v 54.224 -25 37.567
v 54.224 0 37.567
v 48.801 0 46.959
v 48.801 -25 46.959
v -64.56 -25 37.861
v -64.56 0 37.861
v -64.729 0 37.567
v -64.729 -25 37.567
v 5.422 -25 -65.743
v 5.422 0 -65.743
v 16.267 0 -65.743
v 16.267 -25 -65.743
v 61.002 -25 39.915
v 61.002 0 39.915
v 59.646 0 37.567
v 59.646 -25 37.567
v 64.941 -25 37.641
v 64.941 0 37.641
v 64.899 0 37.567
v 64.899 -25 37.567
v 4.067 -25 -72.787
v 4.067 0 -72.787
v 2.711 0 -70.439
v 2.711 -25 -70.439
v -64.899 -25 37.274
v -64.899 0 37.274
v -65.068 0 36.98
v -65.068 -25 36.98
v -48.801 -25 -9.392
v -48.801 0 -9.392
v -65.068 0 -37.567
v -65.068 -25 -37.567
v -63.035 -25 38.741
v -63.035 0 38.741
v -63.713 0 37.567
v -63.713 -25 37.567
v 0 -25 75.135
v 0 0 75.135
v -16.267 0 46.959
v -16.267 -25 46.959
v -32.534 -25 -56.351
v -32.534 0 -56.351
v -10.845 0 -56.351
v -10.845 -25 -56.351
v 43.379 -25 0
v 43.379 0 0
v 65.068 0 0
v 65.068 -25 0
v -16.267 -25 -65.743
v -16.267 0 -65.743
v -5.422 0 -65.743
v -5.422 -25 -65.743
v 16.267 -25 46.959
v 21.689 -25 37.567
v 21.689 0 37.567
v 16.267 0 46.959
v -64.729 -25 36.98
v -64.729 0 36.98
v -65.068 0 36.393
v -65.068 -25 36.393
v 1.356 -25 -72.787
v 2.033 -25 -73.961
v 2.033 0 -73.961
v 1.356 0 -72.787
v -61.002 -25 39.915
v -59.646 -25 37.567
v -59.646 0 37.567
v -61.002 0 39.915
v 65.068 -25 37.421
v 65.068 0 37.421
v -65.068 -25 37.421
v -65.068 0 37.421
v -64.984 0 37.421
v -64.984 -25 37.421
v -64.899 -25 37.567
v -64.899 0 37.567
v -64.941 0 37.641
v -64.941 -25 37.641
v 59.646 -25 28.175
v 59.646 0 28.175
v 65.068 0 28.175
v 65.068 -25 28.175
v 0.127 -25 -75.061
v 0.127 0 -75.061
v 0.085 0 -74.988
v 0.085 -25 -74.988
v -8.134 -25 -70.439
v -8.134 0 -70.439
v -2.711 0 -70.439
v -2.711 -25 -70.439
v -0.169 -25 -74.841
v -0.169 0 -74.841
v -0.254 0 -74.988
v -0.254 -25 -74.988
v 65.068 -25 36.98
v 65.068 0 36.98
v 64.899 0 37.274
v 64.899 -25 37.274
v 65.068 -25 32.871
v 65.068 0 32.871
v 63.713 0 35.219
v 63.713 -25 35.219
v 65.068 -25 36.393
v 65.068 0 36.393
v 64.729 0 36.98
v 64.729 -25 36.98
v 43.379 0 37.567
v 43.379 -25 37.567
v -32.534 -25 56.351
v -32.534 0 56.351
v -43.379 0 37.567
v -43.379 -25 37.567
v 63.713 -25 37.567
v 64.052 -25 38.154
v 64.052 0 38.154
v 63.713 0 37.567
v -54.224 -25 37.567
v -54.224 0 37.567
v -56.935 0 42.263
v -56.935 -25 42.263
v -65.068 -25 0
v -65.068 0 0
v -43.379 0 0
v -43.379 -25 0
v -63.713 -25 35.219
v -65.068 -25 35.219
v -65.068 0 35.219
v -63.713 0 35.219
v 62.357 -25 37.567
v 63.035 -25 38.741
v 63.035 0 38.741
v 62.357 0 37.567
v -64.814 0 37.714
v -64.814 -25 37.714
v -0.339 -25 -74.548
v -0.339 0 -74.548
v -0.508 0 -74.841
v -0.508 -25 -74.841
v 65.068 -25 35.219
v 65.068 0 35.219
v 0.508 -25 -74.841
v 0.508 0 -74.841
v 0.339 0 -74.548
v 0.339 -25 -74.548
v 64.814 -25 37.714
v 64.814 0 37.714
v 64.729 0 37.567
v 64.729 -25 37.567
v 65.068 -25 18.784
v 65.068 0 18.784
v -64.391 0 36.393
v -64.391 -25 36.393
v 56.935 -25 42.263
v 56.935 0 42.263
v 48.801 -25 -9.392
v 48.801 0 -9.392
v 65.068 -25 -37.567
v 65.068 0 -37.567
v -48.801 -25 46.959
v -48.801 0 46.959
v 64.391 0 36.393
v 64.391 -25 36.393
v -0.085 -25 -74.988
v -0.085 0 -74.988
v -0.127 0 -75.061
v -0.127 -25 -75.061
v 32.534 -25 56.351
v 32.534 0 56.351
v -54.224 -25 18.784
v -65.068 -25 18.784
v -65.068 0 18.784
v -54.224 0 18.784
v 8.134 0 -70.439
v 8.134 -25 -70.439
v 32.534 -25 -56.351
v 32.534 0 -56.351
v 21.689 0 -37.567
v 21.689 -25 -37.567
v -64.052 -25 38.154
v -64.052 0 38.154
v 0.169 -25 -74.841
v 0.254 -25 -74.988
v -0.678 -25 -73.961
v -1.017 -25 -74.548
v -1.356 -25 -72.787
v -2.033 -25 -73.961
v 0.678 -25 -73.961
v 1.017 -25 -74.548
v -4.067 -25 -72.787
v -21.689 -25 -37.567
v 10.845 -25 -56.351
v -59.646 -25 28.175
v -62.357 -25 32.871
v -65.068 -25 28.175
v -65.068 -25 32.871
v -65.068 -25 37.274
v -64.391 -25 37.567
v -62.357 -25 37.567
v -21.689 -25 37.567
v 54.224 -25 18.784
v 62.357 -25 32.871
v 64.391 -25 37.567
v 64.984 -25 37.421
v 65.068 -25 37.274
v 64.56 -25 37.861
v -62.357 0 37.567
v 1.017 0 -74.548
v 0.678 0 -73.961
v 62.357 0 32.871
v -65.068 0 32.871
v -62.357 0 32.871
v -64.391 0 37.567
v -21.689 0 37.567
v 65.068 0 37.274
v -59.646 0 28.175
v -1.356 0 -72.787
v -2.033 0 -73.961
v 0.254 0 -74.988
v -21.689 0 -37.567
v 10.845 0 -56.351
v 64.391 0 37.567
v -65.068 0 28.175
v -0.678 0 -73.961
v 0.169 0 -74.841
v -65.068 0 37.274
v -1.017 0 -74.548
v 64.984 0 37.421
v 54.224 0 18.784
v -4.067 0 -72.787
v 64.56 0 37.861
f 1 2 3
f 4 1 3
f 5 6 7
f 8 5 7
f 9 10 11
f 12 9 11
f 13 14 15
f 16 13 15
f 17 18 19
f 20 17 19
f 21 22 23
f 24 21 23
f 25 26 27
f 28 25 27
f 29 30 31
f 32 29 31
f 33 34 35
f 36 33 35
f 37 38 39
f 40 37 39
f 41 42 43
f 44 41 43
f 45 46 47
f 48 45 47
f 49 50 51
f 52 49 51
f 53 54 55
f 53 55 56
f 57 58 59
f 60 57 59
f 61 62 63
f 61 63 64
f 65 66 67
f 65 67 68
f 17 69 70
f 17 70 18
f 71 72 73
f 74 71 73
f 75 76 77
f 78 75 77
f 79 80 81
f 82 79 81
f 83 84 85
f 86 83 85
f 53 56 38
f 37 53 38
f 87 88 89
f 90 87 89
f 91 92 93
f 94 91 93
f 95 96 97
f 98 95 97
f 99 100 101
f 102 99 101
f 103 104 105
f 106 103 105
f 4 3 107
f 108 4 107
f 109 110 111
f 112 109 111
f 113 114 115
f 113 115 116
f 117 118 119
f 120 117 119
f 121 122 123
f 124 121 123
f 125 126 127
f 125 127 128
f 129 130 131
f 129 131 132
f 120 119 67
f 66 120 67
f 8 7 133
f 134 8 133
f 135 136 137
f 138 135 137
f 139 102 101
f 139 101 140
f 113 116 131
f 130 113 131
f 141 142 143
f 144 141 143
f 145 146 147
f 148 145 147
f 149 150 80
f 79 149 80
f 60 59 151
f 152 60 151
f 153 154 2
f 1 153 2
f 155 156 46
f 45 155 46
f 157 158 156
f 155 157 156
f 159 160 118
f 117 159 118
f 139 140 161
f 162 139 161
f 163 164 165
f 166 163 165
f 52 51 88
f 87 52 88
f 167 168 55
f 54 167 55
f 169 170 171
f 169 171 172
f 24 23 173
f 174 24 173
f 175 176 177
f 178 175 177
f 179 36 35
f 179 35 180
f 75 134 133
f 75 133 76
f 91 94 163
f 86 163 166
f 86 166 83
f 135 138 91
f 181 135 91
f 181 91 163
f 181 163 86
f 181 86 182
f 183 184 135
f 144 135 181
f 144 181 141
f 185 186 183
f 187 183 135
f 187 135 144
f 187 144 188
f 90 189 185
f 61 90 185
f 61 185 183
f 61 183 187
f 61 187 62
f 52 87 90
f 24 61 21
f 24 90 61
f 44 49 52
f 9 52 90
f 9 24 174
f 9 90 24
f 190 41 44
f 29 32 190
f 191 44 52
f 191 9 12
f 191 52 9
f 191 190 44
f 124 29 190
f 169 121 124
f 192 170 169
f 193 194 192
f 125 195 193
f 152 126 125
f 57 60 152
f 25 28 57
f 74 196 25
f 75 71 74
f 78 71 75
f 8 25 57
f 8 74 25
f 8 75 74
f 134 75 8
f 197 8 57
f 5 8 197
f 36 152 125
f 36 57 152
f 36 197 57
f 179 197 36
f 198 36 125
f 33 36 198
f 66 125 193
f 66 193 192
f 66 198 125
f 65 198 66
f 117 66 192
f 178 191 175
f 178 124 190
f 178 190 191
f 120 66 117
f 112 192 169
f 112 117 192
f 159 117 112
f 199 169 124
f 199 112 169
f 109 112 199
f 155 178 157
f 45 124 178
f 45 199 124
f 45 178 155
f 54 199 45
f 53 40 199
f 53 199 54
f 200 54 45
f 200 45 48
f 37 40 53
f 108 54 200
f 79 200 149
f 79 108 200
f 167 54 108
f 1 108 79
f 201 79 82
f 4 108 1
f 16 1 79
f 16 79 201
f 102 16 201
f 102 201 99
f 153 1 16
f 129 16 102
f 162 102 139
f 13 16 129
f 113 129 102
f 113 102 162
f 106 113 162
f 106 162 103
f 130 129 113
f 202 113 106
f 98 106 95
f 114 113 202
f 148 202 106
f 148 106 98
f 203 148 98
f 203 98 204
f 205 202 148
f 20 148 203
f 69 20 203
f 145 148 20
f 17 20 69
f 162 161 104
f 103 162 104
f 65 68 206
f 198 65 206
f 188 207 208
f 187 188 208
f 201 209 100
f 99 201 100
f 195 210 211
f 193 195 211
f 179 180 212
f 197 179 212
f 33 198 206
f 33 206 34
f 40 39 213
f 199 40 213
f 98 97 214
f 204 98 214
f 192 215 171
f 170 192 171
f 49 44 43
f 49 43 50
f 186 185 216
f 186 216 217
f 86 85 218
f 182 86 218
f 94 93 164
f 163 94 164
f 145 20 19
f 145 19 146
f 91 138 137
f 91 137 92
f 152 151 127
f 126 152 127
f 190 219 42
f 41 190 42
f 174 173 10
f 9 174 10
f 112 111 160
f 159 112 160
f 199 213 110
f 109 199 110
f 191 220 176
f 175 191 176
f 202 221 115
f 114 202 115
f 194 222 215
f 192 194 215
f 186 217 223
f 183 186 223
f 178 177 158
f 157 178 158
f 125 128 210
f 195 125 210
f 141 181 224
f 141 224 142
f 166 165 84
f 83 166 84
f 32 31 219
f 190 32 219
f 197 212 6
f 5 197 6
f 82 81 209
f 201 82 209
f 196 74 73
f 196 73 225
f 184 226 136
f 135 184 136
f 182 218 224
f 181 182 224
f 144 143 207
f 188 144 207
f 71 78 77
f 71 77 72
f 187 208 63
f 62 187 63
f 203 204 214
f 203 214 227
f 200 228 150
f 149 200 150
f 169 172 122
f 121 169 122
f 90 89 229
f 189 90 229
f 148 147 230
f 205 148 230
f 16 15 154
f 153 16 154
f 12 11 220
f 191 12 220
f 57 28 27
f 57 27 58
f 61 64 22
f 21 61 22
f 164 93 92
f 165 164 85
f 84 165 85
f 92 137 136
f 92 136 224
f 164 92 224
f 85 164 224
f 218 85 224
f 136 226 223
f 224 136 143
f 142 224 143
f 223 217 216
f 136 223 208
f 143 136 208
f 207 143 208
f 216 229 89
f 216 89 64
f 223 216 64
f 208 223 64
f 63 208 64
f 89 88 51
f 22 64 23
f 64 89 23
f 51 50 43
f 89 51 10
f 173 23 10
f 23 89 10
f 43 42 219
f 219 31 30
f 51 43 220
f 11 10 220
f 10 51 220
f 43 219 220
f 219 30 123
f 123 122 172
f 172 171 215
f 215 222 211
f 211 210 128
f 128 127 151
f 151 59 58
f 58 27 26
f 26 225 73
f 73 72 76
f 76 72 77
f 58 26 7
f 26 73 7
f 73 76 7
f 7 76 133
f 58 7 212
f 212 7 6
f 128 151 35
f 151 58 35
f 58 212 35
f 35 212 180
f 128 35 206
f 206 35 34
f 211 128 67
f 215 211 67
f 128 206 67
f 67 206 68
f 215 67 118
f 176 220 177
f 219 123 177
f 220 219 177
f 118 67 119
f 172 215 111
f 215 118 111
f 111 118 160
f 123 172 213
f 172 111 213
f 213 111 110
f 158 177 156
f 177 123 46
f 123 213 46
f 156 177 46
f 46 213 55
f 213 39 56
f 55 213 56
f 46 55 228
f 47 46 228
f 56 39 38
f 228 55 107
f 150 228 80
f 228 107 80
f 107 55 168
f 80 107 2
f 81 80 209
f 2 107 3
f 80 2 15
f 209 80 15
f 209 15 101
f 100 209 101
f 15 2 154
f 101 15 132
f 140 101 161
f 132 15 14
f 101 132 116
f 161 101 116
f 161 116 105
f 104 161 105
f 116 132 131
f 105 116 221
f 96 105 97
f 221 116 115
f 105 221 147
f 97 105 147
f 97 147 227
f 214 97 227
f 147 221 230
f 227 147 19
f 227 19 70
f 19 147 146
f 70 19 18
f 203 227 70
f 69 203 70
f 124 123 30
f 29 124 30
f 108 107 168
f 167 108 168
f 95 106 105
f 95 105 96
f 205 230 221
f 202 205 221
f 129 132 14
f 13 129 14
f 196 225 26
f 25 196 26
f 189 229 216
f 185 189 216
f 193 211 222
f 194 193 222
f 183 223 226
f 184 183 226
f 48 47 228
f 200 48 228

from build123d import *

# Parameters (mm, degrees)
F1_DEPTH = 25


with BuildPart() as f1:
    # F0 (on Front) → F1 (new body)
    with BuildSketch(Plane.XZ):
        Polygon((54.223660749, 37.5672541559), (48.8012946741, 28.1754406169), (59.6460268239, 28.1754406169), (56.9348437865, 32.8713473864), align=None)
        Polygon((43.3789285992, 0), (32.5341964494, 18.7836270779), (21.6894642996, 0), align=None)
        Polygon((0, 0), (-10.8447321498, 18.7836270779), (-32.5341964494, 18.7836270779), (-21.6894642996, 0), align=None)
        Polygon((56.9348437865, 32.8713473864), (59.6460268239, 28.1754406169), (65.0683928988, 28.1754406169), (62.3572098614, 32.8713473864), align=None)
        Polygon((21.6894642996, 0), (32.5341964494, 18.7836270779), (10.8447321498, 18.7836270779), (0, 0), align=None)
        Polygon((48.8012946741, 28.1754406169), (54.223660749, 18.7836270779), (65.0683928988, 18.7836270779), (59.6460268239, 28.1754406169), align=None)
        Polygon((-21.6894642996, 0), (-43.3789285992, 0), (-48.8012946741, -9.391813539), (-16.2670982247, -9.391813539), align=None)
        Polygon((0, -37.5672541559), (-10.8447321498, -18.7836270779), (-21.6894642996, -37.5672541559), align=None)
        Polygon((32.5341964494, 18.7836270779), (21.6894642996, 37.5672541559), (10.8447321498, 18.7836270779), align=None)
        Polygon((-59.6460268239, 28.1754406169), (-48.8012946741, 28.1754406169), (-54.223660749, 37.5672541559), (-56.9348437865, 32.8713473864), align=None)
        Polygon((-10.8447321498, -18.7836270779), (0, 0), (-21.6894642996, 0), (-16.2670982247, -9.391813539), align=None)
        Polygon((54.223660749, 18.7836270779), (32.5341964494, 18.7836270779), (43.3789285992, 0), (65.0683928988, 0), align=None)
        Polygon((-21.6894642996, 0), (-32.5341964494, 18.7836270779), (-43.3789285992, 0), align=None)
        Polygon((32.5341964494, -37.5672541559), (16.2670982247, -9.391813539), (10.8447321498, -18.7836270779), (21.6894642996, -37.5672541559), align=None)
        Polygon((10.8447321498, -56.3508812338), (0, -37.5672541559), (-10.8447321498, -56.3508812338), (0, -56.3508812338), align=None)
        Polygon((48.8012946741, -9.391813539), (43.3789285992, 0), (21.6894642996, 0), (16.2670982247, -9.391813539), align=None)
        Polygon((48.8012946741, 46.9590676948), (43.3789285992, 37.5672541559), (48.8012946741, 28.1754406169), (54.223660749, 37.5672541559), align=None)
        Polygon((-21.6894642996, -37.5672541559), (-10.8447321498, -18.7836270779), (-16.2670982247, -9.391813539), (-32.5341964494, -37.5672541559), align=None)
        Polygon((43.3789285992, 37.5672541559), (32.5341964494, 18.7836270779), (54.223660749, 18.7836270779), (48.8012946741, 28.1754406169), align=None)
        Polygon((-10.8447321498, -56.3508812338), (0, -37.5672541559), (-21.6894642996, -37.5672541559), (-32.5341964494, -56.3508812338), align=None)
        Polygon((32.5341964494, 56.3508812338), (21.6894642996, 37.5672541559), (32.5341964494, 18.7836270779), (43.3789285992, 37.5672541559), align=None)
        Polygon((16.2670982247, -9.391813539), (21.6894642996, 0), (0, 0), (10.8447321498, -18.7836270779), align=None)
        Polygon((21.6894642996, -37.5672541559), (10.8447321498, -18.7836270779), (0, -37.5672541559), align=None)
        Polygon((16.2670982247, 46.9590676948), (0, 75.1345083117), (-16.2670982247, 46.9590676948), (0, 18.7836270779), align=None)
        Polygon((65.0683928988, -37.5672541559), (48.8012946741, -9.391813539), (16.2670982247, -9.391813539), (32.5341964494, -37.5672541559), align=None)
        Polygon((-16.2670982247, -9.391813539), (-48.8012946741, -9.391813539), (-65.0683928988, -37.5672541559), (-32.5341964494, -37.5672541559), align=None)
        Polygon((-43.3789285992, 0), (-32.5341964494, 18.7836270779), (-54.223660749, 18.7836270779), (-65.0683928988, 0), align=None)
        Polygon((-10.8447321498, 18.7836270779), (-21.6894642996, 37.5672541559), (-32.5341964494, 18.7836270779), align=None)
        Polygon((-65.0683928988, 18.7836270779), (-54.223660749, 18.7836270779), (-48.8012946741, 28.1754406169), (-59.6460268239, 28.1754406169), align=None)
        Polygon((-48.8012946741, 28.1754406169), (-43.3789285992, 37.5672541559), (-48.8012946741, 46.9590676948), (-54.223660749, 37.5672541559), align=None)
        Polygon((-32.5341964494, 18.7836270779), (-21.6894642996, 37.5672541559), (-32.5341964494, 56.3508812338), (-43.3789285992, 37.5672541559), align=None)
        Polygon((32.5341964494, -56.3508812338), (21.6894642996, -37.5672541559), (0, -37.5672541559), (10.8447321498, -56.3508812338), align=None)
        Polygon((16.2670982247, -65.7426947728), (10.8447321498, -56.3508812338), (0, -56.3508812338), (5.4223660749, -65.7426947728), align=None)
        Polygon((0, -56.3508812338), (-10.8447321498, -56.3508812338), (-16.2670982247, -65.7426947728), (-5.4223660749, -65.7426947728), align=None)
        Polygon((-54.223660749, 18.7836270779), (-32.5341964494, 18.7836270779), (-43.3789285992, 37.5672541559), (-48.8012946741, 28.1754406169), align=None)
        Polygon((21.6894642996, 37.5672541559), (16.2670982247, 46.9590676948), (0, 18.7836270779), (10.8447321498, 18.7836270779), align=None)
        Polygon((10.8447321498, -18.7836270779), (0, 0), (-10.8447321498, -18.7836270779), (0, -37.5672541559), align=None)
        Polygon((0, 18.7836270779), (-16.2670982247, 46.9590676948), (-21.6894642996, 37.5672541559), (-10.8447321498, 18.7836270779), align=None)
        Polygon((10.8447321498, 18.7836270779), (0, 18.7836270779), (-10.8447321498, 18.7836270779), (0, 0), align=None)
        Polygon((-56.9348437865, 32.8713473864), (-54.223660749, 37.5672541559), (-56.9348437865, 42.2631609254), (-59.6460268239, 37.5672541559), align=None)
        Polygon((0, -65.7426947728), (-5.4223660749, -65.7426947728), (-8.1335491124, -70.4386015423), (-2.7111830375, -70.4386015423), align=None)
        Polygon((8.1335491124, -70.4386015423), (5.4223660749, -65.7426947728), (0, -65.7426947728), (2.7111830375, -70.4386015423), align=None)
        Polygon((56.9348437865, 42.2631609254), (54.223660749, 37.5672541559), (56.9348437865, 32.8713473864), (59.6460268239, 37.5672541559), align=None)
        Polygon((-65.0683928988, 28.1754406169), (-59.6460268239, 28.1754406169), (-56.9348437865, 32.8713473864), (-62.3572098614, 32.8713473864), align=None)
        Polygon((5.4223660749, -65.7426947728), (0, -56.3508812338), (-5.4223660749, -65.7426947728), (0, -65.7426947728), align=None)
        Polygon((2.7111830375, -70.4386015423), (0, -65.7426947728), (-2.7111830375, -70.4386015423), (0, -70.4386015423), align=None)
        Polygon((-62.3572098614, 32.8713473864), (-56.9348437865, 32.8713473864), (-59.6460268239, 37.5672541559), (-61.0016183427, 35.2193007711), align=None)
        Polygon((59.6460268239, 37.5672541559), (56.9348437865, 32.8713473864), (62.3572098614, 32.8713473864), (61.0016183426, 35.2193007711), align=None)
        Polygon((4.0667745562, -72.786554927), (2.7111830375, -70.4386015423), (0, -70.4386015423), (1.3555915187, -72.786554927), align=None)
        Polygon((-61.0016183427, 35.2193007711), (-59.6460268239, 37.5672541559), (-61.0016183427, 39.9152075406), (-62.3572098614, 37.5672541559), align=None)
        Polygon((61.0016183426, 39.9152075406), (59.6460268239, 37.5672541559), (61.0016183426, 35.2193007711), (62.3572098614, 37.5672541559), align=None)
        Polygon((0, -70.4386015423), (-2.7111830375, -70.4386015423), (-4.0667745562, -72.786554927), (-1.3555915187, -72.786554927), align=None)
        Polygon((61.0016183426, 35.2193007711), (62.3572098614, 32.8713473864), (65.0683928988, 32.8713473864), (63.7128013801, 35.2193007711), align=None)
        Polygon((62.3572098614, 37.5672541559), (61.0016183426, 35.2193007711), (63.7128013801, 35.2193007711), (63.0350056207, 36.3932774635), align=None)
        Polygon((-65.0683928988, 32.8713473864), (-62.3572098614, 32.8713473864), (-61.0016183427, 35.2193007711), (-63.7128013801, 35.2193007711), align=None)
        Polygon((1.3555915187, -72.786554927), (0, -70.4386015423), (-1.3555915187, -72.786554927), (0, -72.786554927), align=None)
        Polygon((63.0350056207, 36.3932774635), (63.7128013801, 35.2193007711), (65.0683928988, 35.2193007711), (64.3905971395, 36.3932774635), align=None)
        Polygon((63.0350056207, 38.7412308482), (62.3572098614, 37.5672541559), (63.0350056207, 36.3932774635), (63.7128013801, 37.5672541559), align=None)
        Polygon((63.7128013801, 37.5672541559), (63.0350056207, 36.3932774635), (64.3905971395, 36.3932774635), (64.0516992598, 36.9802658097), align=None)
        Polygon((0, -72.786554927), (-1.3555915187, -72.786554927), (-2.0333872781, -73.9605316194), (-0.6777957594, -73.9605316194), align=None)
        Polygon((2.0333872781, -73.9605316194), (1.3555915187, -72.786554927), (0, -72.786554927), (0.6777957594, -73.9605316194), align=None)
        Polygon((-65.0683928988, 35.2193007711), (-63.7128013801, 35.2193007711), (-63.0350056207, 36.3932774635), (-64.3905971395, 36.3932774635), align=None)
        Polygon((-63.7128013801, 35.2193007711), (-61.0016183427, 35.2193007711), (-62.3572098614, 37.5672541559), (-63.0350056207, 36.3932774635), align=None)
        Polygon((0.5083468195, -74.8410141387), (0.3388978797, -74.5475199656), (0, -74.5475199656), (0.1694489398, -74.8410141387), align=None)
        Polygon((0.6777957594, -73.9605316194), (0, -72.786554927), (-0.6777957594, -73.9605316194), (0, -73.9605316194), align=None)
        Polygon((1.016693639, -74.5475199656), (0.6777957594, -73.9605316194), (0, -73.9605316194), (0.3388978797, -74.5475199656), align=None)
        Polygon((-63.0350056207, 36.3932774635), (-62.3572098614, 37.5672541559), (-63.0350056207, 38.7412308482), (-63.7128013801, 37.5672541559), align=None)
        Polygon((0.3388978797, -74.5475199656), (0, -73.9605316194), (-0.3388978797, -74.5475199656), (0, -74.5475199656), align=None)
        Polygon((0, -74.5475199656), (-0.3388978797, -74.5475199656), (-0.5083468195, -74.8410141387), (-0.1694489398, -74.8410141387), align=None)
        Polygon((0, -74.8410141387), (-0.1694489398, -74.8410141387), (-0.2541734098, -74.9877612252), (-0.0847244699, -74.9877612252), align=None)
        Polygon((64.3905971395, 37.5672541559), (64.0516992598, 36.9802658097), (64.7294950191, 36.9802658097), (64.5600460793, 37.2737599828), align=None)
        Polygon((-65.0683928988, 36.3932774635), (-64.3905971395, 36.3932774635), (-64.0516992598, 36.9802658097), (-64.7294950191, 36.9802658097), align=None)
        Polygon((0.1694489398, -74.8410141387), (0, -74.5475199656), (-0.1694489398, -74.8410141387), (0, -74.8410141387), align=None)
        Polygon((-64.0516992598, 36.9802658097), (-63.7128013801, 37.5672541559), (-64.0516992598, 38.1542425021), (-64.3905971395, 37.5672541559), align=None)
        Polygon((64.0516992598, 38.1542425021), (63.7128013801, 37.5672541559), (64.0516992598, 36.9802658097), (64.3905971395, 37.5672541559), align=None)
        Polygon((-64.3905971395, 36.3932774635), (-63.0350056207, 36.3932774635), (-63.7128013801, 37.5672541559), (-64.0516992598, 36.9802658097), align=None)
        Polygon((-64.5600460793, 37.2737599828), (-64.3905971395, 37.5672541559), (-64.5600460793, 37.860748329), (-64.7294950191, 37.5672541559), align=None)
        Polygon((0.2541734098, -74.9877612252), (0.1694489398, -74.8410141387), (0, -74.8410141387), (0.0847244699, -74.9877612252), align=None)
        Polygon((0, -73.9605316194), (-0.6777957594, -73.9605316194), (-1.016693639, -74.5475199656), (-0.3388978797, -74.5475199656), align=None)
        Polygon((64.5600460793, 37.860748329), (64.3905971395, 37.5672541559), (64.5600460793, 37.2737599828), (64.7294950191, 37.5672541559), align=None)
        Polygon((0.0847244699, -74.9877612252), (0, -74.8410141387), (-0.0847244699, -74.9877612252), align=None)
        Polygon((-64.7294950191, 36.9802658097), (-64.0516992598, 36.9802658097), (-64.3905971395, 37.5672541559), (-64.5600460793, 37.2737599828), align=None)
        Polygon((64.0516992598, 36.9802658097), (64.3905971395, 36.3932774635), (65.0683928988, 36.3932774635), (64.7294950191, 36.9802658097), align=None)
        Polygon((-64.9836684289, 37.4205070693), (-64.8142194891, 37.4205070693), (-64.898943959, 37.5672541559), align=None)
        Polygon((64.8142194891, 37.7140012424), (64.7294950191, 37.5672541559), (64.8142194891, 37.4205070693), (64.898943959, 37.5672541559), align=None)
        Polygon((-65.0683928988, 36.9802658097), (-64.7294950191, 36.9802658097), (-64.5600460793, 37.2737599828), (-64.898943959, 37.2737599828), align=None)
        Polygon((64.5600460793, 37.2737599828), (64.7294950191, 36.9802658097), (65.0683928988, 36.9802658097), (64.898943959, 37.2737599828), align=None)
        Polygon((0.1270867049, -75.0611347685), (0.0847244699, -74.9877612252), (-0.0847244699, -74.9877612252), (-0.1270867049, -75.0611347685), align=None)
        Polygon((64.8142194891, 37.4205070693), (64.898943959, 37.2737599828), (65.0683928988, 37.2737599828), (64.9836684289, 37.4205070693), align=None)
        Polygon((-65.0683928988, 37.2737599828), (-64.898943959, 37.2737599828), (-64.8142194891, 37.4205070693), (-64.9836684289, 37.4205070693), align=None)
        Polygon((64.898943959, 37.5672541559), (64.8142194891, 37.4205070693), (64.9836684289, 37.4205070693), align=None)
        Polygon((-64.8142194891, 37.4205070693), (-64.7294950191, 37.5672541559), (-64.8142194891, 37.7140012424), (-64.898943959, 37.5672541559), align=None)
        Polygon((-64.898943959, 37.2737599828), (-64.5600460793, 37.2737599828), (-64.7294950191, 37.5672541559), (-64.8142194891, 37.4205070693), align=None)
        Polygon((64.9413061939, 37.6406276991), (64.898943959, 37.5672541559), (64.9836684289, 37.4205070693), (65.0683928988, 37.4205070693), align=None)
        Polygon((64.7294950191, 37.5672541559), (64.5600460793, 37.2737599828), (64.898943959, 37.2737599828), (64.8142194891, 37.4205070693), align=None)
        Polygon((-65.0683928988, 37.4205070693), (-64.9836684289, 37.4205070693), (-64.898943959, 37.5672541559), (-64.9413061939, 37.6406276991), align=None)
    extrude(amount=F1_DEPTH)


solid = f1.part
